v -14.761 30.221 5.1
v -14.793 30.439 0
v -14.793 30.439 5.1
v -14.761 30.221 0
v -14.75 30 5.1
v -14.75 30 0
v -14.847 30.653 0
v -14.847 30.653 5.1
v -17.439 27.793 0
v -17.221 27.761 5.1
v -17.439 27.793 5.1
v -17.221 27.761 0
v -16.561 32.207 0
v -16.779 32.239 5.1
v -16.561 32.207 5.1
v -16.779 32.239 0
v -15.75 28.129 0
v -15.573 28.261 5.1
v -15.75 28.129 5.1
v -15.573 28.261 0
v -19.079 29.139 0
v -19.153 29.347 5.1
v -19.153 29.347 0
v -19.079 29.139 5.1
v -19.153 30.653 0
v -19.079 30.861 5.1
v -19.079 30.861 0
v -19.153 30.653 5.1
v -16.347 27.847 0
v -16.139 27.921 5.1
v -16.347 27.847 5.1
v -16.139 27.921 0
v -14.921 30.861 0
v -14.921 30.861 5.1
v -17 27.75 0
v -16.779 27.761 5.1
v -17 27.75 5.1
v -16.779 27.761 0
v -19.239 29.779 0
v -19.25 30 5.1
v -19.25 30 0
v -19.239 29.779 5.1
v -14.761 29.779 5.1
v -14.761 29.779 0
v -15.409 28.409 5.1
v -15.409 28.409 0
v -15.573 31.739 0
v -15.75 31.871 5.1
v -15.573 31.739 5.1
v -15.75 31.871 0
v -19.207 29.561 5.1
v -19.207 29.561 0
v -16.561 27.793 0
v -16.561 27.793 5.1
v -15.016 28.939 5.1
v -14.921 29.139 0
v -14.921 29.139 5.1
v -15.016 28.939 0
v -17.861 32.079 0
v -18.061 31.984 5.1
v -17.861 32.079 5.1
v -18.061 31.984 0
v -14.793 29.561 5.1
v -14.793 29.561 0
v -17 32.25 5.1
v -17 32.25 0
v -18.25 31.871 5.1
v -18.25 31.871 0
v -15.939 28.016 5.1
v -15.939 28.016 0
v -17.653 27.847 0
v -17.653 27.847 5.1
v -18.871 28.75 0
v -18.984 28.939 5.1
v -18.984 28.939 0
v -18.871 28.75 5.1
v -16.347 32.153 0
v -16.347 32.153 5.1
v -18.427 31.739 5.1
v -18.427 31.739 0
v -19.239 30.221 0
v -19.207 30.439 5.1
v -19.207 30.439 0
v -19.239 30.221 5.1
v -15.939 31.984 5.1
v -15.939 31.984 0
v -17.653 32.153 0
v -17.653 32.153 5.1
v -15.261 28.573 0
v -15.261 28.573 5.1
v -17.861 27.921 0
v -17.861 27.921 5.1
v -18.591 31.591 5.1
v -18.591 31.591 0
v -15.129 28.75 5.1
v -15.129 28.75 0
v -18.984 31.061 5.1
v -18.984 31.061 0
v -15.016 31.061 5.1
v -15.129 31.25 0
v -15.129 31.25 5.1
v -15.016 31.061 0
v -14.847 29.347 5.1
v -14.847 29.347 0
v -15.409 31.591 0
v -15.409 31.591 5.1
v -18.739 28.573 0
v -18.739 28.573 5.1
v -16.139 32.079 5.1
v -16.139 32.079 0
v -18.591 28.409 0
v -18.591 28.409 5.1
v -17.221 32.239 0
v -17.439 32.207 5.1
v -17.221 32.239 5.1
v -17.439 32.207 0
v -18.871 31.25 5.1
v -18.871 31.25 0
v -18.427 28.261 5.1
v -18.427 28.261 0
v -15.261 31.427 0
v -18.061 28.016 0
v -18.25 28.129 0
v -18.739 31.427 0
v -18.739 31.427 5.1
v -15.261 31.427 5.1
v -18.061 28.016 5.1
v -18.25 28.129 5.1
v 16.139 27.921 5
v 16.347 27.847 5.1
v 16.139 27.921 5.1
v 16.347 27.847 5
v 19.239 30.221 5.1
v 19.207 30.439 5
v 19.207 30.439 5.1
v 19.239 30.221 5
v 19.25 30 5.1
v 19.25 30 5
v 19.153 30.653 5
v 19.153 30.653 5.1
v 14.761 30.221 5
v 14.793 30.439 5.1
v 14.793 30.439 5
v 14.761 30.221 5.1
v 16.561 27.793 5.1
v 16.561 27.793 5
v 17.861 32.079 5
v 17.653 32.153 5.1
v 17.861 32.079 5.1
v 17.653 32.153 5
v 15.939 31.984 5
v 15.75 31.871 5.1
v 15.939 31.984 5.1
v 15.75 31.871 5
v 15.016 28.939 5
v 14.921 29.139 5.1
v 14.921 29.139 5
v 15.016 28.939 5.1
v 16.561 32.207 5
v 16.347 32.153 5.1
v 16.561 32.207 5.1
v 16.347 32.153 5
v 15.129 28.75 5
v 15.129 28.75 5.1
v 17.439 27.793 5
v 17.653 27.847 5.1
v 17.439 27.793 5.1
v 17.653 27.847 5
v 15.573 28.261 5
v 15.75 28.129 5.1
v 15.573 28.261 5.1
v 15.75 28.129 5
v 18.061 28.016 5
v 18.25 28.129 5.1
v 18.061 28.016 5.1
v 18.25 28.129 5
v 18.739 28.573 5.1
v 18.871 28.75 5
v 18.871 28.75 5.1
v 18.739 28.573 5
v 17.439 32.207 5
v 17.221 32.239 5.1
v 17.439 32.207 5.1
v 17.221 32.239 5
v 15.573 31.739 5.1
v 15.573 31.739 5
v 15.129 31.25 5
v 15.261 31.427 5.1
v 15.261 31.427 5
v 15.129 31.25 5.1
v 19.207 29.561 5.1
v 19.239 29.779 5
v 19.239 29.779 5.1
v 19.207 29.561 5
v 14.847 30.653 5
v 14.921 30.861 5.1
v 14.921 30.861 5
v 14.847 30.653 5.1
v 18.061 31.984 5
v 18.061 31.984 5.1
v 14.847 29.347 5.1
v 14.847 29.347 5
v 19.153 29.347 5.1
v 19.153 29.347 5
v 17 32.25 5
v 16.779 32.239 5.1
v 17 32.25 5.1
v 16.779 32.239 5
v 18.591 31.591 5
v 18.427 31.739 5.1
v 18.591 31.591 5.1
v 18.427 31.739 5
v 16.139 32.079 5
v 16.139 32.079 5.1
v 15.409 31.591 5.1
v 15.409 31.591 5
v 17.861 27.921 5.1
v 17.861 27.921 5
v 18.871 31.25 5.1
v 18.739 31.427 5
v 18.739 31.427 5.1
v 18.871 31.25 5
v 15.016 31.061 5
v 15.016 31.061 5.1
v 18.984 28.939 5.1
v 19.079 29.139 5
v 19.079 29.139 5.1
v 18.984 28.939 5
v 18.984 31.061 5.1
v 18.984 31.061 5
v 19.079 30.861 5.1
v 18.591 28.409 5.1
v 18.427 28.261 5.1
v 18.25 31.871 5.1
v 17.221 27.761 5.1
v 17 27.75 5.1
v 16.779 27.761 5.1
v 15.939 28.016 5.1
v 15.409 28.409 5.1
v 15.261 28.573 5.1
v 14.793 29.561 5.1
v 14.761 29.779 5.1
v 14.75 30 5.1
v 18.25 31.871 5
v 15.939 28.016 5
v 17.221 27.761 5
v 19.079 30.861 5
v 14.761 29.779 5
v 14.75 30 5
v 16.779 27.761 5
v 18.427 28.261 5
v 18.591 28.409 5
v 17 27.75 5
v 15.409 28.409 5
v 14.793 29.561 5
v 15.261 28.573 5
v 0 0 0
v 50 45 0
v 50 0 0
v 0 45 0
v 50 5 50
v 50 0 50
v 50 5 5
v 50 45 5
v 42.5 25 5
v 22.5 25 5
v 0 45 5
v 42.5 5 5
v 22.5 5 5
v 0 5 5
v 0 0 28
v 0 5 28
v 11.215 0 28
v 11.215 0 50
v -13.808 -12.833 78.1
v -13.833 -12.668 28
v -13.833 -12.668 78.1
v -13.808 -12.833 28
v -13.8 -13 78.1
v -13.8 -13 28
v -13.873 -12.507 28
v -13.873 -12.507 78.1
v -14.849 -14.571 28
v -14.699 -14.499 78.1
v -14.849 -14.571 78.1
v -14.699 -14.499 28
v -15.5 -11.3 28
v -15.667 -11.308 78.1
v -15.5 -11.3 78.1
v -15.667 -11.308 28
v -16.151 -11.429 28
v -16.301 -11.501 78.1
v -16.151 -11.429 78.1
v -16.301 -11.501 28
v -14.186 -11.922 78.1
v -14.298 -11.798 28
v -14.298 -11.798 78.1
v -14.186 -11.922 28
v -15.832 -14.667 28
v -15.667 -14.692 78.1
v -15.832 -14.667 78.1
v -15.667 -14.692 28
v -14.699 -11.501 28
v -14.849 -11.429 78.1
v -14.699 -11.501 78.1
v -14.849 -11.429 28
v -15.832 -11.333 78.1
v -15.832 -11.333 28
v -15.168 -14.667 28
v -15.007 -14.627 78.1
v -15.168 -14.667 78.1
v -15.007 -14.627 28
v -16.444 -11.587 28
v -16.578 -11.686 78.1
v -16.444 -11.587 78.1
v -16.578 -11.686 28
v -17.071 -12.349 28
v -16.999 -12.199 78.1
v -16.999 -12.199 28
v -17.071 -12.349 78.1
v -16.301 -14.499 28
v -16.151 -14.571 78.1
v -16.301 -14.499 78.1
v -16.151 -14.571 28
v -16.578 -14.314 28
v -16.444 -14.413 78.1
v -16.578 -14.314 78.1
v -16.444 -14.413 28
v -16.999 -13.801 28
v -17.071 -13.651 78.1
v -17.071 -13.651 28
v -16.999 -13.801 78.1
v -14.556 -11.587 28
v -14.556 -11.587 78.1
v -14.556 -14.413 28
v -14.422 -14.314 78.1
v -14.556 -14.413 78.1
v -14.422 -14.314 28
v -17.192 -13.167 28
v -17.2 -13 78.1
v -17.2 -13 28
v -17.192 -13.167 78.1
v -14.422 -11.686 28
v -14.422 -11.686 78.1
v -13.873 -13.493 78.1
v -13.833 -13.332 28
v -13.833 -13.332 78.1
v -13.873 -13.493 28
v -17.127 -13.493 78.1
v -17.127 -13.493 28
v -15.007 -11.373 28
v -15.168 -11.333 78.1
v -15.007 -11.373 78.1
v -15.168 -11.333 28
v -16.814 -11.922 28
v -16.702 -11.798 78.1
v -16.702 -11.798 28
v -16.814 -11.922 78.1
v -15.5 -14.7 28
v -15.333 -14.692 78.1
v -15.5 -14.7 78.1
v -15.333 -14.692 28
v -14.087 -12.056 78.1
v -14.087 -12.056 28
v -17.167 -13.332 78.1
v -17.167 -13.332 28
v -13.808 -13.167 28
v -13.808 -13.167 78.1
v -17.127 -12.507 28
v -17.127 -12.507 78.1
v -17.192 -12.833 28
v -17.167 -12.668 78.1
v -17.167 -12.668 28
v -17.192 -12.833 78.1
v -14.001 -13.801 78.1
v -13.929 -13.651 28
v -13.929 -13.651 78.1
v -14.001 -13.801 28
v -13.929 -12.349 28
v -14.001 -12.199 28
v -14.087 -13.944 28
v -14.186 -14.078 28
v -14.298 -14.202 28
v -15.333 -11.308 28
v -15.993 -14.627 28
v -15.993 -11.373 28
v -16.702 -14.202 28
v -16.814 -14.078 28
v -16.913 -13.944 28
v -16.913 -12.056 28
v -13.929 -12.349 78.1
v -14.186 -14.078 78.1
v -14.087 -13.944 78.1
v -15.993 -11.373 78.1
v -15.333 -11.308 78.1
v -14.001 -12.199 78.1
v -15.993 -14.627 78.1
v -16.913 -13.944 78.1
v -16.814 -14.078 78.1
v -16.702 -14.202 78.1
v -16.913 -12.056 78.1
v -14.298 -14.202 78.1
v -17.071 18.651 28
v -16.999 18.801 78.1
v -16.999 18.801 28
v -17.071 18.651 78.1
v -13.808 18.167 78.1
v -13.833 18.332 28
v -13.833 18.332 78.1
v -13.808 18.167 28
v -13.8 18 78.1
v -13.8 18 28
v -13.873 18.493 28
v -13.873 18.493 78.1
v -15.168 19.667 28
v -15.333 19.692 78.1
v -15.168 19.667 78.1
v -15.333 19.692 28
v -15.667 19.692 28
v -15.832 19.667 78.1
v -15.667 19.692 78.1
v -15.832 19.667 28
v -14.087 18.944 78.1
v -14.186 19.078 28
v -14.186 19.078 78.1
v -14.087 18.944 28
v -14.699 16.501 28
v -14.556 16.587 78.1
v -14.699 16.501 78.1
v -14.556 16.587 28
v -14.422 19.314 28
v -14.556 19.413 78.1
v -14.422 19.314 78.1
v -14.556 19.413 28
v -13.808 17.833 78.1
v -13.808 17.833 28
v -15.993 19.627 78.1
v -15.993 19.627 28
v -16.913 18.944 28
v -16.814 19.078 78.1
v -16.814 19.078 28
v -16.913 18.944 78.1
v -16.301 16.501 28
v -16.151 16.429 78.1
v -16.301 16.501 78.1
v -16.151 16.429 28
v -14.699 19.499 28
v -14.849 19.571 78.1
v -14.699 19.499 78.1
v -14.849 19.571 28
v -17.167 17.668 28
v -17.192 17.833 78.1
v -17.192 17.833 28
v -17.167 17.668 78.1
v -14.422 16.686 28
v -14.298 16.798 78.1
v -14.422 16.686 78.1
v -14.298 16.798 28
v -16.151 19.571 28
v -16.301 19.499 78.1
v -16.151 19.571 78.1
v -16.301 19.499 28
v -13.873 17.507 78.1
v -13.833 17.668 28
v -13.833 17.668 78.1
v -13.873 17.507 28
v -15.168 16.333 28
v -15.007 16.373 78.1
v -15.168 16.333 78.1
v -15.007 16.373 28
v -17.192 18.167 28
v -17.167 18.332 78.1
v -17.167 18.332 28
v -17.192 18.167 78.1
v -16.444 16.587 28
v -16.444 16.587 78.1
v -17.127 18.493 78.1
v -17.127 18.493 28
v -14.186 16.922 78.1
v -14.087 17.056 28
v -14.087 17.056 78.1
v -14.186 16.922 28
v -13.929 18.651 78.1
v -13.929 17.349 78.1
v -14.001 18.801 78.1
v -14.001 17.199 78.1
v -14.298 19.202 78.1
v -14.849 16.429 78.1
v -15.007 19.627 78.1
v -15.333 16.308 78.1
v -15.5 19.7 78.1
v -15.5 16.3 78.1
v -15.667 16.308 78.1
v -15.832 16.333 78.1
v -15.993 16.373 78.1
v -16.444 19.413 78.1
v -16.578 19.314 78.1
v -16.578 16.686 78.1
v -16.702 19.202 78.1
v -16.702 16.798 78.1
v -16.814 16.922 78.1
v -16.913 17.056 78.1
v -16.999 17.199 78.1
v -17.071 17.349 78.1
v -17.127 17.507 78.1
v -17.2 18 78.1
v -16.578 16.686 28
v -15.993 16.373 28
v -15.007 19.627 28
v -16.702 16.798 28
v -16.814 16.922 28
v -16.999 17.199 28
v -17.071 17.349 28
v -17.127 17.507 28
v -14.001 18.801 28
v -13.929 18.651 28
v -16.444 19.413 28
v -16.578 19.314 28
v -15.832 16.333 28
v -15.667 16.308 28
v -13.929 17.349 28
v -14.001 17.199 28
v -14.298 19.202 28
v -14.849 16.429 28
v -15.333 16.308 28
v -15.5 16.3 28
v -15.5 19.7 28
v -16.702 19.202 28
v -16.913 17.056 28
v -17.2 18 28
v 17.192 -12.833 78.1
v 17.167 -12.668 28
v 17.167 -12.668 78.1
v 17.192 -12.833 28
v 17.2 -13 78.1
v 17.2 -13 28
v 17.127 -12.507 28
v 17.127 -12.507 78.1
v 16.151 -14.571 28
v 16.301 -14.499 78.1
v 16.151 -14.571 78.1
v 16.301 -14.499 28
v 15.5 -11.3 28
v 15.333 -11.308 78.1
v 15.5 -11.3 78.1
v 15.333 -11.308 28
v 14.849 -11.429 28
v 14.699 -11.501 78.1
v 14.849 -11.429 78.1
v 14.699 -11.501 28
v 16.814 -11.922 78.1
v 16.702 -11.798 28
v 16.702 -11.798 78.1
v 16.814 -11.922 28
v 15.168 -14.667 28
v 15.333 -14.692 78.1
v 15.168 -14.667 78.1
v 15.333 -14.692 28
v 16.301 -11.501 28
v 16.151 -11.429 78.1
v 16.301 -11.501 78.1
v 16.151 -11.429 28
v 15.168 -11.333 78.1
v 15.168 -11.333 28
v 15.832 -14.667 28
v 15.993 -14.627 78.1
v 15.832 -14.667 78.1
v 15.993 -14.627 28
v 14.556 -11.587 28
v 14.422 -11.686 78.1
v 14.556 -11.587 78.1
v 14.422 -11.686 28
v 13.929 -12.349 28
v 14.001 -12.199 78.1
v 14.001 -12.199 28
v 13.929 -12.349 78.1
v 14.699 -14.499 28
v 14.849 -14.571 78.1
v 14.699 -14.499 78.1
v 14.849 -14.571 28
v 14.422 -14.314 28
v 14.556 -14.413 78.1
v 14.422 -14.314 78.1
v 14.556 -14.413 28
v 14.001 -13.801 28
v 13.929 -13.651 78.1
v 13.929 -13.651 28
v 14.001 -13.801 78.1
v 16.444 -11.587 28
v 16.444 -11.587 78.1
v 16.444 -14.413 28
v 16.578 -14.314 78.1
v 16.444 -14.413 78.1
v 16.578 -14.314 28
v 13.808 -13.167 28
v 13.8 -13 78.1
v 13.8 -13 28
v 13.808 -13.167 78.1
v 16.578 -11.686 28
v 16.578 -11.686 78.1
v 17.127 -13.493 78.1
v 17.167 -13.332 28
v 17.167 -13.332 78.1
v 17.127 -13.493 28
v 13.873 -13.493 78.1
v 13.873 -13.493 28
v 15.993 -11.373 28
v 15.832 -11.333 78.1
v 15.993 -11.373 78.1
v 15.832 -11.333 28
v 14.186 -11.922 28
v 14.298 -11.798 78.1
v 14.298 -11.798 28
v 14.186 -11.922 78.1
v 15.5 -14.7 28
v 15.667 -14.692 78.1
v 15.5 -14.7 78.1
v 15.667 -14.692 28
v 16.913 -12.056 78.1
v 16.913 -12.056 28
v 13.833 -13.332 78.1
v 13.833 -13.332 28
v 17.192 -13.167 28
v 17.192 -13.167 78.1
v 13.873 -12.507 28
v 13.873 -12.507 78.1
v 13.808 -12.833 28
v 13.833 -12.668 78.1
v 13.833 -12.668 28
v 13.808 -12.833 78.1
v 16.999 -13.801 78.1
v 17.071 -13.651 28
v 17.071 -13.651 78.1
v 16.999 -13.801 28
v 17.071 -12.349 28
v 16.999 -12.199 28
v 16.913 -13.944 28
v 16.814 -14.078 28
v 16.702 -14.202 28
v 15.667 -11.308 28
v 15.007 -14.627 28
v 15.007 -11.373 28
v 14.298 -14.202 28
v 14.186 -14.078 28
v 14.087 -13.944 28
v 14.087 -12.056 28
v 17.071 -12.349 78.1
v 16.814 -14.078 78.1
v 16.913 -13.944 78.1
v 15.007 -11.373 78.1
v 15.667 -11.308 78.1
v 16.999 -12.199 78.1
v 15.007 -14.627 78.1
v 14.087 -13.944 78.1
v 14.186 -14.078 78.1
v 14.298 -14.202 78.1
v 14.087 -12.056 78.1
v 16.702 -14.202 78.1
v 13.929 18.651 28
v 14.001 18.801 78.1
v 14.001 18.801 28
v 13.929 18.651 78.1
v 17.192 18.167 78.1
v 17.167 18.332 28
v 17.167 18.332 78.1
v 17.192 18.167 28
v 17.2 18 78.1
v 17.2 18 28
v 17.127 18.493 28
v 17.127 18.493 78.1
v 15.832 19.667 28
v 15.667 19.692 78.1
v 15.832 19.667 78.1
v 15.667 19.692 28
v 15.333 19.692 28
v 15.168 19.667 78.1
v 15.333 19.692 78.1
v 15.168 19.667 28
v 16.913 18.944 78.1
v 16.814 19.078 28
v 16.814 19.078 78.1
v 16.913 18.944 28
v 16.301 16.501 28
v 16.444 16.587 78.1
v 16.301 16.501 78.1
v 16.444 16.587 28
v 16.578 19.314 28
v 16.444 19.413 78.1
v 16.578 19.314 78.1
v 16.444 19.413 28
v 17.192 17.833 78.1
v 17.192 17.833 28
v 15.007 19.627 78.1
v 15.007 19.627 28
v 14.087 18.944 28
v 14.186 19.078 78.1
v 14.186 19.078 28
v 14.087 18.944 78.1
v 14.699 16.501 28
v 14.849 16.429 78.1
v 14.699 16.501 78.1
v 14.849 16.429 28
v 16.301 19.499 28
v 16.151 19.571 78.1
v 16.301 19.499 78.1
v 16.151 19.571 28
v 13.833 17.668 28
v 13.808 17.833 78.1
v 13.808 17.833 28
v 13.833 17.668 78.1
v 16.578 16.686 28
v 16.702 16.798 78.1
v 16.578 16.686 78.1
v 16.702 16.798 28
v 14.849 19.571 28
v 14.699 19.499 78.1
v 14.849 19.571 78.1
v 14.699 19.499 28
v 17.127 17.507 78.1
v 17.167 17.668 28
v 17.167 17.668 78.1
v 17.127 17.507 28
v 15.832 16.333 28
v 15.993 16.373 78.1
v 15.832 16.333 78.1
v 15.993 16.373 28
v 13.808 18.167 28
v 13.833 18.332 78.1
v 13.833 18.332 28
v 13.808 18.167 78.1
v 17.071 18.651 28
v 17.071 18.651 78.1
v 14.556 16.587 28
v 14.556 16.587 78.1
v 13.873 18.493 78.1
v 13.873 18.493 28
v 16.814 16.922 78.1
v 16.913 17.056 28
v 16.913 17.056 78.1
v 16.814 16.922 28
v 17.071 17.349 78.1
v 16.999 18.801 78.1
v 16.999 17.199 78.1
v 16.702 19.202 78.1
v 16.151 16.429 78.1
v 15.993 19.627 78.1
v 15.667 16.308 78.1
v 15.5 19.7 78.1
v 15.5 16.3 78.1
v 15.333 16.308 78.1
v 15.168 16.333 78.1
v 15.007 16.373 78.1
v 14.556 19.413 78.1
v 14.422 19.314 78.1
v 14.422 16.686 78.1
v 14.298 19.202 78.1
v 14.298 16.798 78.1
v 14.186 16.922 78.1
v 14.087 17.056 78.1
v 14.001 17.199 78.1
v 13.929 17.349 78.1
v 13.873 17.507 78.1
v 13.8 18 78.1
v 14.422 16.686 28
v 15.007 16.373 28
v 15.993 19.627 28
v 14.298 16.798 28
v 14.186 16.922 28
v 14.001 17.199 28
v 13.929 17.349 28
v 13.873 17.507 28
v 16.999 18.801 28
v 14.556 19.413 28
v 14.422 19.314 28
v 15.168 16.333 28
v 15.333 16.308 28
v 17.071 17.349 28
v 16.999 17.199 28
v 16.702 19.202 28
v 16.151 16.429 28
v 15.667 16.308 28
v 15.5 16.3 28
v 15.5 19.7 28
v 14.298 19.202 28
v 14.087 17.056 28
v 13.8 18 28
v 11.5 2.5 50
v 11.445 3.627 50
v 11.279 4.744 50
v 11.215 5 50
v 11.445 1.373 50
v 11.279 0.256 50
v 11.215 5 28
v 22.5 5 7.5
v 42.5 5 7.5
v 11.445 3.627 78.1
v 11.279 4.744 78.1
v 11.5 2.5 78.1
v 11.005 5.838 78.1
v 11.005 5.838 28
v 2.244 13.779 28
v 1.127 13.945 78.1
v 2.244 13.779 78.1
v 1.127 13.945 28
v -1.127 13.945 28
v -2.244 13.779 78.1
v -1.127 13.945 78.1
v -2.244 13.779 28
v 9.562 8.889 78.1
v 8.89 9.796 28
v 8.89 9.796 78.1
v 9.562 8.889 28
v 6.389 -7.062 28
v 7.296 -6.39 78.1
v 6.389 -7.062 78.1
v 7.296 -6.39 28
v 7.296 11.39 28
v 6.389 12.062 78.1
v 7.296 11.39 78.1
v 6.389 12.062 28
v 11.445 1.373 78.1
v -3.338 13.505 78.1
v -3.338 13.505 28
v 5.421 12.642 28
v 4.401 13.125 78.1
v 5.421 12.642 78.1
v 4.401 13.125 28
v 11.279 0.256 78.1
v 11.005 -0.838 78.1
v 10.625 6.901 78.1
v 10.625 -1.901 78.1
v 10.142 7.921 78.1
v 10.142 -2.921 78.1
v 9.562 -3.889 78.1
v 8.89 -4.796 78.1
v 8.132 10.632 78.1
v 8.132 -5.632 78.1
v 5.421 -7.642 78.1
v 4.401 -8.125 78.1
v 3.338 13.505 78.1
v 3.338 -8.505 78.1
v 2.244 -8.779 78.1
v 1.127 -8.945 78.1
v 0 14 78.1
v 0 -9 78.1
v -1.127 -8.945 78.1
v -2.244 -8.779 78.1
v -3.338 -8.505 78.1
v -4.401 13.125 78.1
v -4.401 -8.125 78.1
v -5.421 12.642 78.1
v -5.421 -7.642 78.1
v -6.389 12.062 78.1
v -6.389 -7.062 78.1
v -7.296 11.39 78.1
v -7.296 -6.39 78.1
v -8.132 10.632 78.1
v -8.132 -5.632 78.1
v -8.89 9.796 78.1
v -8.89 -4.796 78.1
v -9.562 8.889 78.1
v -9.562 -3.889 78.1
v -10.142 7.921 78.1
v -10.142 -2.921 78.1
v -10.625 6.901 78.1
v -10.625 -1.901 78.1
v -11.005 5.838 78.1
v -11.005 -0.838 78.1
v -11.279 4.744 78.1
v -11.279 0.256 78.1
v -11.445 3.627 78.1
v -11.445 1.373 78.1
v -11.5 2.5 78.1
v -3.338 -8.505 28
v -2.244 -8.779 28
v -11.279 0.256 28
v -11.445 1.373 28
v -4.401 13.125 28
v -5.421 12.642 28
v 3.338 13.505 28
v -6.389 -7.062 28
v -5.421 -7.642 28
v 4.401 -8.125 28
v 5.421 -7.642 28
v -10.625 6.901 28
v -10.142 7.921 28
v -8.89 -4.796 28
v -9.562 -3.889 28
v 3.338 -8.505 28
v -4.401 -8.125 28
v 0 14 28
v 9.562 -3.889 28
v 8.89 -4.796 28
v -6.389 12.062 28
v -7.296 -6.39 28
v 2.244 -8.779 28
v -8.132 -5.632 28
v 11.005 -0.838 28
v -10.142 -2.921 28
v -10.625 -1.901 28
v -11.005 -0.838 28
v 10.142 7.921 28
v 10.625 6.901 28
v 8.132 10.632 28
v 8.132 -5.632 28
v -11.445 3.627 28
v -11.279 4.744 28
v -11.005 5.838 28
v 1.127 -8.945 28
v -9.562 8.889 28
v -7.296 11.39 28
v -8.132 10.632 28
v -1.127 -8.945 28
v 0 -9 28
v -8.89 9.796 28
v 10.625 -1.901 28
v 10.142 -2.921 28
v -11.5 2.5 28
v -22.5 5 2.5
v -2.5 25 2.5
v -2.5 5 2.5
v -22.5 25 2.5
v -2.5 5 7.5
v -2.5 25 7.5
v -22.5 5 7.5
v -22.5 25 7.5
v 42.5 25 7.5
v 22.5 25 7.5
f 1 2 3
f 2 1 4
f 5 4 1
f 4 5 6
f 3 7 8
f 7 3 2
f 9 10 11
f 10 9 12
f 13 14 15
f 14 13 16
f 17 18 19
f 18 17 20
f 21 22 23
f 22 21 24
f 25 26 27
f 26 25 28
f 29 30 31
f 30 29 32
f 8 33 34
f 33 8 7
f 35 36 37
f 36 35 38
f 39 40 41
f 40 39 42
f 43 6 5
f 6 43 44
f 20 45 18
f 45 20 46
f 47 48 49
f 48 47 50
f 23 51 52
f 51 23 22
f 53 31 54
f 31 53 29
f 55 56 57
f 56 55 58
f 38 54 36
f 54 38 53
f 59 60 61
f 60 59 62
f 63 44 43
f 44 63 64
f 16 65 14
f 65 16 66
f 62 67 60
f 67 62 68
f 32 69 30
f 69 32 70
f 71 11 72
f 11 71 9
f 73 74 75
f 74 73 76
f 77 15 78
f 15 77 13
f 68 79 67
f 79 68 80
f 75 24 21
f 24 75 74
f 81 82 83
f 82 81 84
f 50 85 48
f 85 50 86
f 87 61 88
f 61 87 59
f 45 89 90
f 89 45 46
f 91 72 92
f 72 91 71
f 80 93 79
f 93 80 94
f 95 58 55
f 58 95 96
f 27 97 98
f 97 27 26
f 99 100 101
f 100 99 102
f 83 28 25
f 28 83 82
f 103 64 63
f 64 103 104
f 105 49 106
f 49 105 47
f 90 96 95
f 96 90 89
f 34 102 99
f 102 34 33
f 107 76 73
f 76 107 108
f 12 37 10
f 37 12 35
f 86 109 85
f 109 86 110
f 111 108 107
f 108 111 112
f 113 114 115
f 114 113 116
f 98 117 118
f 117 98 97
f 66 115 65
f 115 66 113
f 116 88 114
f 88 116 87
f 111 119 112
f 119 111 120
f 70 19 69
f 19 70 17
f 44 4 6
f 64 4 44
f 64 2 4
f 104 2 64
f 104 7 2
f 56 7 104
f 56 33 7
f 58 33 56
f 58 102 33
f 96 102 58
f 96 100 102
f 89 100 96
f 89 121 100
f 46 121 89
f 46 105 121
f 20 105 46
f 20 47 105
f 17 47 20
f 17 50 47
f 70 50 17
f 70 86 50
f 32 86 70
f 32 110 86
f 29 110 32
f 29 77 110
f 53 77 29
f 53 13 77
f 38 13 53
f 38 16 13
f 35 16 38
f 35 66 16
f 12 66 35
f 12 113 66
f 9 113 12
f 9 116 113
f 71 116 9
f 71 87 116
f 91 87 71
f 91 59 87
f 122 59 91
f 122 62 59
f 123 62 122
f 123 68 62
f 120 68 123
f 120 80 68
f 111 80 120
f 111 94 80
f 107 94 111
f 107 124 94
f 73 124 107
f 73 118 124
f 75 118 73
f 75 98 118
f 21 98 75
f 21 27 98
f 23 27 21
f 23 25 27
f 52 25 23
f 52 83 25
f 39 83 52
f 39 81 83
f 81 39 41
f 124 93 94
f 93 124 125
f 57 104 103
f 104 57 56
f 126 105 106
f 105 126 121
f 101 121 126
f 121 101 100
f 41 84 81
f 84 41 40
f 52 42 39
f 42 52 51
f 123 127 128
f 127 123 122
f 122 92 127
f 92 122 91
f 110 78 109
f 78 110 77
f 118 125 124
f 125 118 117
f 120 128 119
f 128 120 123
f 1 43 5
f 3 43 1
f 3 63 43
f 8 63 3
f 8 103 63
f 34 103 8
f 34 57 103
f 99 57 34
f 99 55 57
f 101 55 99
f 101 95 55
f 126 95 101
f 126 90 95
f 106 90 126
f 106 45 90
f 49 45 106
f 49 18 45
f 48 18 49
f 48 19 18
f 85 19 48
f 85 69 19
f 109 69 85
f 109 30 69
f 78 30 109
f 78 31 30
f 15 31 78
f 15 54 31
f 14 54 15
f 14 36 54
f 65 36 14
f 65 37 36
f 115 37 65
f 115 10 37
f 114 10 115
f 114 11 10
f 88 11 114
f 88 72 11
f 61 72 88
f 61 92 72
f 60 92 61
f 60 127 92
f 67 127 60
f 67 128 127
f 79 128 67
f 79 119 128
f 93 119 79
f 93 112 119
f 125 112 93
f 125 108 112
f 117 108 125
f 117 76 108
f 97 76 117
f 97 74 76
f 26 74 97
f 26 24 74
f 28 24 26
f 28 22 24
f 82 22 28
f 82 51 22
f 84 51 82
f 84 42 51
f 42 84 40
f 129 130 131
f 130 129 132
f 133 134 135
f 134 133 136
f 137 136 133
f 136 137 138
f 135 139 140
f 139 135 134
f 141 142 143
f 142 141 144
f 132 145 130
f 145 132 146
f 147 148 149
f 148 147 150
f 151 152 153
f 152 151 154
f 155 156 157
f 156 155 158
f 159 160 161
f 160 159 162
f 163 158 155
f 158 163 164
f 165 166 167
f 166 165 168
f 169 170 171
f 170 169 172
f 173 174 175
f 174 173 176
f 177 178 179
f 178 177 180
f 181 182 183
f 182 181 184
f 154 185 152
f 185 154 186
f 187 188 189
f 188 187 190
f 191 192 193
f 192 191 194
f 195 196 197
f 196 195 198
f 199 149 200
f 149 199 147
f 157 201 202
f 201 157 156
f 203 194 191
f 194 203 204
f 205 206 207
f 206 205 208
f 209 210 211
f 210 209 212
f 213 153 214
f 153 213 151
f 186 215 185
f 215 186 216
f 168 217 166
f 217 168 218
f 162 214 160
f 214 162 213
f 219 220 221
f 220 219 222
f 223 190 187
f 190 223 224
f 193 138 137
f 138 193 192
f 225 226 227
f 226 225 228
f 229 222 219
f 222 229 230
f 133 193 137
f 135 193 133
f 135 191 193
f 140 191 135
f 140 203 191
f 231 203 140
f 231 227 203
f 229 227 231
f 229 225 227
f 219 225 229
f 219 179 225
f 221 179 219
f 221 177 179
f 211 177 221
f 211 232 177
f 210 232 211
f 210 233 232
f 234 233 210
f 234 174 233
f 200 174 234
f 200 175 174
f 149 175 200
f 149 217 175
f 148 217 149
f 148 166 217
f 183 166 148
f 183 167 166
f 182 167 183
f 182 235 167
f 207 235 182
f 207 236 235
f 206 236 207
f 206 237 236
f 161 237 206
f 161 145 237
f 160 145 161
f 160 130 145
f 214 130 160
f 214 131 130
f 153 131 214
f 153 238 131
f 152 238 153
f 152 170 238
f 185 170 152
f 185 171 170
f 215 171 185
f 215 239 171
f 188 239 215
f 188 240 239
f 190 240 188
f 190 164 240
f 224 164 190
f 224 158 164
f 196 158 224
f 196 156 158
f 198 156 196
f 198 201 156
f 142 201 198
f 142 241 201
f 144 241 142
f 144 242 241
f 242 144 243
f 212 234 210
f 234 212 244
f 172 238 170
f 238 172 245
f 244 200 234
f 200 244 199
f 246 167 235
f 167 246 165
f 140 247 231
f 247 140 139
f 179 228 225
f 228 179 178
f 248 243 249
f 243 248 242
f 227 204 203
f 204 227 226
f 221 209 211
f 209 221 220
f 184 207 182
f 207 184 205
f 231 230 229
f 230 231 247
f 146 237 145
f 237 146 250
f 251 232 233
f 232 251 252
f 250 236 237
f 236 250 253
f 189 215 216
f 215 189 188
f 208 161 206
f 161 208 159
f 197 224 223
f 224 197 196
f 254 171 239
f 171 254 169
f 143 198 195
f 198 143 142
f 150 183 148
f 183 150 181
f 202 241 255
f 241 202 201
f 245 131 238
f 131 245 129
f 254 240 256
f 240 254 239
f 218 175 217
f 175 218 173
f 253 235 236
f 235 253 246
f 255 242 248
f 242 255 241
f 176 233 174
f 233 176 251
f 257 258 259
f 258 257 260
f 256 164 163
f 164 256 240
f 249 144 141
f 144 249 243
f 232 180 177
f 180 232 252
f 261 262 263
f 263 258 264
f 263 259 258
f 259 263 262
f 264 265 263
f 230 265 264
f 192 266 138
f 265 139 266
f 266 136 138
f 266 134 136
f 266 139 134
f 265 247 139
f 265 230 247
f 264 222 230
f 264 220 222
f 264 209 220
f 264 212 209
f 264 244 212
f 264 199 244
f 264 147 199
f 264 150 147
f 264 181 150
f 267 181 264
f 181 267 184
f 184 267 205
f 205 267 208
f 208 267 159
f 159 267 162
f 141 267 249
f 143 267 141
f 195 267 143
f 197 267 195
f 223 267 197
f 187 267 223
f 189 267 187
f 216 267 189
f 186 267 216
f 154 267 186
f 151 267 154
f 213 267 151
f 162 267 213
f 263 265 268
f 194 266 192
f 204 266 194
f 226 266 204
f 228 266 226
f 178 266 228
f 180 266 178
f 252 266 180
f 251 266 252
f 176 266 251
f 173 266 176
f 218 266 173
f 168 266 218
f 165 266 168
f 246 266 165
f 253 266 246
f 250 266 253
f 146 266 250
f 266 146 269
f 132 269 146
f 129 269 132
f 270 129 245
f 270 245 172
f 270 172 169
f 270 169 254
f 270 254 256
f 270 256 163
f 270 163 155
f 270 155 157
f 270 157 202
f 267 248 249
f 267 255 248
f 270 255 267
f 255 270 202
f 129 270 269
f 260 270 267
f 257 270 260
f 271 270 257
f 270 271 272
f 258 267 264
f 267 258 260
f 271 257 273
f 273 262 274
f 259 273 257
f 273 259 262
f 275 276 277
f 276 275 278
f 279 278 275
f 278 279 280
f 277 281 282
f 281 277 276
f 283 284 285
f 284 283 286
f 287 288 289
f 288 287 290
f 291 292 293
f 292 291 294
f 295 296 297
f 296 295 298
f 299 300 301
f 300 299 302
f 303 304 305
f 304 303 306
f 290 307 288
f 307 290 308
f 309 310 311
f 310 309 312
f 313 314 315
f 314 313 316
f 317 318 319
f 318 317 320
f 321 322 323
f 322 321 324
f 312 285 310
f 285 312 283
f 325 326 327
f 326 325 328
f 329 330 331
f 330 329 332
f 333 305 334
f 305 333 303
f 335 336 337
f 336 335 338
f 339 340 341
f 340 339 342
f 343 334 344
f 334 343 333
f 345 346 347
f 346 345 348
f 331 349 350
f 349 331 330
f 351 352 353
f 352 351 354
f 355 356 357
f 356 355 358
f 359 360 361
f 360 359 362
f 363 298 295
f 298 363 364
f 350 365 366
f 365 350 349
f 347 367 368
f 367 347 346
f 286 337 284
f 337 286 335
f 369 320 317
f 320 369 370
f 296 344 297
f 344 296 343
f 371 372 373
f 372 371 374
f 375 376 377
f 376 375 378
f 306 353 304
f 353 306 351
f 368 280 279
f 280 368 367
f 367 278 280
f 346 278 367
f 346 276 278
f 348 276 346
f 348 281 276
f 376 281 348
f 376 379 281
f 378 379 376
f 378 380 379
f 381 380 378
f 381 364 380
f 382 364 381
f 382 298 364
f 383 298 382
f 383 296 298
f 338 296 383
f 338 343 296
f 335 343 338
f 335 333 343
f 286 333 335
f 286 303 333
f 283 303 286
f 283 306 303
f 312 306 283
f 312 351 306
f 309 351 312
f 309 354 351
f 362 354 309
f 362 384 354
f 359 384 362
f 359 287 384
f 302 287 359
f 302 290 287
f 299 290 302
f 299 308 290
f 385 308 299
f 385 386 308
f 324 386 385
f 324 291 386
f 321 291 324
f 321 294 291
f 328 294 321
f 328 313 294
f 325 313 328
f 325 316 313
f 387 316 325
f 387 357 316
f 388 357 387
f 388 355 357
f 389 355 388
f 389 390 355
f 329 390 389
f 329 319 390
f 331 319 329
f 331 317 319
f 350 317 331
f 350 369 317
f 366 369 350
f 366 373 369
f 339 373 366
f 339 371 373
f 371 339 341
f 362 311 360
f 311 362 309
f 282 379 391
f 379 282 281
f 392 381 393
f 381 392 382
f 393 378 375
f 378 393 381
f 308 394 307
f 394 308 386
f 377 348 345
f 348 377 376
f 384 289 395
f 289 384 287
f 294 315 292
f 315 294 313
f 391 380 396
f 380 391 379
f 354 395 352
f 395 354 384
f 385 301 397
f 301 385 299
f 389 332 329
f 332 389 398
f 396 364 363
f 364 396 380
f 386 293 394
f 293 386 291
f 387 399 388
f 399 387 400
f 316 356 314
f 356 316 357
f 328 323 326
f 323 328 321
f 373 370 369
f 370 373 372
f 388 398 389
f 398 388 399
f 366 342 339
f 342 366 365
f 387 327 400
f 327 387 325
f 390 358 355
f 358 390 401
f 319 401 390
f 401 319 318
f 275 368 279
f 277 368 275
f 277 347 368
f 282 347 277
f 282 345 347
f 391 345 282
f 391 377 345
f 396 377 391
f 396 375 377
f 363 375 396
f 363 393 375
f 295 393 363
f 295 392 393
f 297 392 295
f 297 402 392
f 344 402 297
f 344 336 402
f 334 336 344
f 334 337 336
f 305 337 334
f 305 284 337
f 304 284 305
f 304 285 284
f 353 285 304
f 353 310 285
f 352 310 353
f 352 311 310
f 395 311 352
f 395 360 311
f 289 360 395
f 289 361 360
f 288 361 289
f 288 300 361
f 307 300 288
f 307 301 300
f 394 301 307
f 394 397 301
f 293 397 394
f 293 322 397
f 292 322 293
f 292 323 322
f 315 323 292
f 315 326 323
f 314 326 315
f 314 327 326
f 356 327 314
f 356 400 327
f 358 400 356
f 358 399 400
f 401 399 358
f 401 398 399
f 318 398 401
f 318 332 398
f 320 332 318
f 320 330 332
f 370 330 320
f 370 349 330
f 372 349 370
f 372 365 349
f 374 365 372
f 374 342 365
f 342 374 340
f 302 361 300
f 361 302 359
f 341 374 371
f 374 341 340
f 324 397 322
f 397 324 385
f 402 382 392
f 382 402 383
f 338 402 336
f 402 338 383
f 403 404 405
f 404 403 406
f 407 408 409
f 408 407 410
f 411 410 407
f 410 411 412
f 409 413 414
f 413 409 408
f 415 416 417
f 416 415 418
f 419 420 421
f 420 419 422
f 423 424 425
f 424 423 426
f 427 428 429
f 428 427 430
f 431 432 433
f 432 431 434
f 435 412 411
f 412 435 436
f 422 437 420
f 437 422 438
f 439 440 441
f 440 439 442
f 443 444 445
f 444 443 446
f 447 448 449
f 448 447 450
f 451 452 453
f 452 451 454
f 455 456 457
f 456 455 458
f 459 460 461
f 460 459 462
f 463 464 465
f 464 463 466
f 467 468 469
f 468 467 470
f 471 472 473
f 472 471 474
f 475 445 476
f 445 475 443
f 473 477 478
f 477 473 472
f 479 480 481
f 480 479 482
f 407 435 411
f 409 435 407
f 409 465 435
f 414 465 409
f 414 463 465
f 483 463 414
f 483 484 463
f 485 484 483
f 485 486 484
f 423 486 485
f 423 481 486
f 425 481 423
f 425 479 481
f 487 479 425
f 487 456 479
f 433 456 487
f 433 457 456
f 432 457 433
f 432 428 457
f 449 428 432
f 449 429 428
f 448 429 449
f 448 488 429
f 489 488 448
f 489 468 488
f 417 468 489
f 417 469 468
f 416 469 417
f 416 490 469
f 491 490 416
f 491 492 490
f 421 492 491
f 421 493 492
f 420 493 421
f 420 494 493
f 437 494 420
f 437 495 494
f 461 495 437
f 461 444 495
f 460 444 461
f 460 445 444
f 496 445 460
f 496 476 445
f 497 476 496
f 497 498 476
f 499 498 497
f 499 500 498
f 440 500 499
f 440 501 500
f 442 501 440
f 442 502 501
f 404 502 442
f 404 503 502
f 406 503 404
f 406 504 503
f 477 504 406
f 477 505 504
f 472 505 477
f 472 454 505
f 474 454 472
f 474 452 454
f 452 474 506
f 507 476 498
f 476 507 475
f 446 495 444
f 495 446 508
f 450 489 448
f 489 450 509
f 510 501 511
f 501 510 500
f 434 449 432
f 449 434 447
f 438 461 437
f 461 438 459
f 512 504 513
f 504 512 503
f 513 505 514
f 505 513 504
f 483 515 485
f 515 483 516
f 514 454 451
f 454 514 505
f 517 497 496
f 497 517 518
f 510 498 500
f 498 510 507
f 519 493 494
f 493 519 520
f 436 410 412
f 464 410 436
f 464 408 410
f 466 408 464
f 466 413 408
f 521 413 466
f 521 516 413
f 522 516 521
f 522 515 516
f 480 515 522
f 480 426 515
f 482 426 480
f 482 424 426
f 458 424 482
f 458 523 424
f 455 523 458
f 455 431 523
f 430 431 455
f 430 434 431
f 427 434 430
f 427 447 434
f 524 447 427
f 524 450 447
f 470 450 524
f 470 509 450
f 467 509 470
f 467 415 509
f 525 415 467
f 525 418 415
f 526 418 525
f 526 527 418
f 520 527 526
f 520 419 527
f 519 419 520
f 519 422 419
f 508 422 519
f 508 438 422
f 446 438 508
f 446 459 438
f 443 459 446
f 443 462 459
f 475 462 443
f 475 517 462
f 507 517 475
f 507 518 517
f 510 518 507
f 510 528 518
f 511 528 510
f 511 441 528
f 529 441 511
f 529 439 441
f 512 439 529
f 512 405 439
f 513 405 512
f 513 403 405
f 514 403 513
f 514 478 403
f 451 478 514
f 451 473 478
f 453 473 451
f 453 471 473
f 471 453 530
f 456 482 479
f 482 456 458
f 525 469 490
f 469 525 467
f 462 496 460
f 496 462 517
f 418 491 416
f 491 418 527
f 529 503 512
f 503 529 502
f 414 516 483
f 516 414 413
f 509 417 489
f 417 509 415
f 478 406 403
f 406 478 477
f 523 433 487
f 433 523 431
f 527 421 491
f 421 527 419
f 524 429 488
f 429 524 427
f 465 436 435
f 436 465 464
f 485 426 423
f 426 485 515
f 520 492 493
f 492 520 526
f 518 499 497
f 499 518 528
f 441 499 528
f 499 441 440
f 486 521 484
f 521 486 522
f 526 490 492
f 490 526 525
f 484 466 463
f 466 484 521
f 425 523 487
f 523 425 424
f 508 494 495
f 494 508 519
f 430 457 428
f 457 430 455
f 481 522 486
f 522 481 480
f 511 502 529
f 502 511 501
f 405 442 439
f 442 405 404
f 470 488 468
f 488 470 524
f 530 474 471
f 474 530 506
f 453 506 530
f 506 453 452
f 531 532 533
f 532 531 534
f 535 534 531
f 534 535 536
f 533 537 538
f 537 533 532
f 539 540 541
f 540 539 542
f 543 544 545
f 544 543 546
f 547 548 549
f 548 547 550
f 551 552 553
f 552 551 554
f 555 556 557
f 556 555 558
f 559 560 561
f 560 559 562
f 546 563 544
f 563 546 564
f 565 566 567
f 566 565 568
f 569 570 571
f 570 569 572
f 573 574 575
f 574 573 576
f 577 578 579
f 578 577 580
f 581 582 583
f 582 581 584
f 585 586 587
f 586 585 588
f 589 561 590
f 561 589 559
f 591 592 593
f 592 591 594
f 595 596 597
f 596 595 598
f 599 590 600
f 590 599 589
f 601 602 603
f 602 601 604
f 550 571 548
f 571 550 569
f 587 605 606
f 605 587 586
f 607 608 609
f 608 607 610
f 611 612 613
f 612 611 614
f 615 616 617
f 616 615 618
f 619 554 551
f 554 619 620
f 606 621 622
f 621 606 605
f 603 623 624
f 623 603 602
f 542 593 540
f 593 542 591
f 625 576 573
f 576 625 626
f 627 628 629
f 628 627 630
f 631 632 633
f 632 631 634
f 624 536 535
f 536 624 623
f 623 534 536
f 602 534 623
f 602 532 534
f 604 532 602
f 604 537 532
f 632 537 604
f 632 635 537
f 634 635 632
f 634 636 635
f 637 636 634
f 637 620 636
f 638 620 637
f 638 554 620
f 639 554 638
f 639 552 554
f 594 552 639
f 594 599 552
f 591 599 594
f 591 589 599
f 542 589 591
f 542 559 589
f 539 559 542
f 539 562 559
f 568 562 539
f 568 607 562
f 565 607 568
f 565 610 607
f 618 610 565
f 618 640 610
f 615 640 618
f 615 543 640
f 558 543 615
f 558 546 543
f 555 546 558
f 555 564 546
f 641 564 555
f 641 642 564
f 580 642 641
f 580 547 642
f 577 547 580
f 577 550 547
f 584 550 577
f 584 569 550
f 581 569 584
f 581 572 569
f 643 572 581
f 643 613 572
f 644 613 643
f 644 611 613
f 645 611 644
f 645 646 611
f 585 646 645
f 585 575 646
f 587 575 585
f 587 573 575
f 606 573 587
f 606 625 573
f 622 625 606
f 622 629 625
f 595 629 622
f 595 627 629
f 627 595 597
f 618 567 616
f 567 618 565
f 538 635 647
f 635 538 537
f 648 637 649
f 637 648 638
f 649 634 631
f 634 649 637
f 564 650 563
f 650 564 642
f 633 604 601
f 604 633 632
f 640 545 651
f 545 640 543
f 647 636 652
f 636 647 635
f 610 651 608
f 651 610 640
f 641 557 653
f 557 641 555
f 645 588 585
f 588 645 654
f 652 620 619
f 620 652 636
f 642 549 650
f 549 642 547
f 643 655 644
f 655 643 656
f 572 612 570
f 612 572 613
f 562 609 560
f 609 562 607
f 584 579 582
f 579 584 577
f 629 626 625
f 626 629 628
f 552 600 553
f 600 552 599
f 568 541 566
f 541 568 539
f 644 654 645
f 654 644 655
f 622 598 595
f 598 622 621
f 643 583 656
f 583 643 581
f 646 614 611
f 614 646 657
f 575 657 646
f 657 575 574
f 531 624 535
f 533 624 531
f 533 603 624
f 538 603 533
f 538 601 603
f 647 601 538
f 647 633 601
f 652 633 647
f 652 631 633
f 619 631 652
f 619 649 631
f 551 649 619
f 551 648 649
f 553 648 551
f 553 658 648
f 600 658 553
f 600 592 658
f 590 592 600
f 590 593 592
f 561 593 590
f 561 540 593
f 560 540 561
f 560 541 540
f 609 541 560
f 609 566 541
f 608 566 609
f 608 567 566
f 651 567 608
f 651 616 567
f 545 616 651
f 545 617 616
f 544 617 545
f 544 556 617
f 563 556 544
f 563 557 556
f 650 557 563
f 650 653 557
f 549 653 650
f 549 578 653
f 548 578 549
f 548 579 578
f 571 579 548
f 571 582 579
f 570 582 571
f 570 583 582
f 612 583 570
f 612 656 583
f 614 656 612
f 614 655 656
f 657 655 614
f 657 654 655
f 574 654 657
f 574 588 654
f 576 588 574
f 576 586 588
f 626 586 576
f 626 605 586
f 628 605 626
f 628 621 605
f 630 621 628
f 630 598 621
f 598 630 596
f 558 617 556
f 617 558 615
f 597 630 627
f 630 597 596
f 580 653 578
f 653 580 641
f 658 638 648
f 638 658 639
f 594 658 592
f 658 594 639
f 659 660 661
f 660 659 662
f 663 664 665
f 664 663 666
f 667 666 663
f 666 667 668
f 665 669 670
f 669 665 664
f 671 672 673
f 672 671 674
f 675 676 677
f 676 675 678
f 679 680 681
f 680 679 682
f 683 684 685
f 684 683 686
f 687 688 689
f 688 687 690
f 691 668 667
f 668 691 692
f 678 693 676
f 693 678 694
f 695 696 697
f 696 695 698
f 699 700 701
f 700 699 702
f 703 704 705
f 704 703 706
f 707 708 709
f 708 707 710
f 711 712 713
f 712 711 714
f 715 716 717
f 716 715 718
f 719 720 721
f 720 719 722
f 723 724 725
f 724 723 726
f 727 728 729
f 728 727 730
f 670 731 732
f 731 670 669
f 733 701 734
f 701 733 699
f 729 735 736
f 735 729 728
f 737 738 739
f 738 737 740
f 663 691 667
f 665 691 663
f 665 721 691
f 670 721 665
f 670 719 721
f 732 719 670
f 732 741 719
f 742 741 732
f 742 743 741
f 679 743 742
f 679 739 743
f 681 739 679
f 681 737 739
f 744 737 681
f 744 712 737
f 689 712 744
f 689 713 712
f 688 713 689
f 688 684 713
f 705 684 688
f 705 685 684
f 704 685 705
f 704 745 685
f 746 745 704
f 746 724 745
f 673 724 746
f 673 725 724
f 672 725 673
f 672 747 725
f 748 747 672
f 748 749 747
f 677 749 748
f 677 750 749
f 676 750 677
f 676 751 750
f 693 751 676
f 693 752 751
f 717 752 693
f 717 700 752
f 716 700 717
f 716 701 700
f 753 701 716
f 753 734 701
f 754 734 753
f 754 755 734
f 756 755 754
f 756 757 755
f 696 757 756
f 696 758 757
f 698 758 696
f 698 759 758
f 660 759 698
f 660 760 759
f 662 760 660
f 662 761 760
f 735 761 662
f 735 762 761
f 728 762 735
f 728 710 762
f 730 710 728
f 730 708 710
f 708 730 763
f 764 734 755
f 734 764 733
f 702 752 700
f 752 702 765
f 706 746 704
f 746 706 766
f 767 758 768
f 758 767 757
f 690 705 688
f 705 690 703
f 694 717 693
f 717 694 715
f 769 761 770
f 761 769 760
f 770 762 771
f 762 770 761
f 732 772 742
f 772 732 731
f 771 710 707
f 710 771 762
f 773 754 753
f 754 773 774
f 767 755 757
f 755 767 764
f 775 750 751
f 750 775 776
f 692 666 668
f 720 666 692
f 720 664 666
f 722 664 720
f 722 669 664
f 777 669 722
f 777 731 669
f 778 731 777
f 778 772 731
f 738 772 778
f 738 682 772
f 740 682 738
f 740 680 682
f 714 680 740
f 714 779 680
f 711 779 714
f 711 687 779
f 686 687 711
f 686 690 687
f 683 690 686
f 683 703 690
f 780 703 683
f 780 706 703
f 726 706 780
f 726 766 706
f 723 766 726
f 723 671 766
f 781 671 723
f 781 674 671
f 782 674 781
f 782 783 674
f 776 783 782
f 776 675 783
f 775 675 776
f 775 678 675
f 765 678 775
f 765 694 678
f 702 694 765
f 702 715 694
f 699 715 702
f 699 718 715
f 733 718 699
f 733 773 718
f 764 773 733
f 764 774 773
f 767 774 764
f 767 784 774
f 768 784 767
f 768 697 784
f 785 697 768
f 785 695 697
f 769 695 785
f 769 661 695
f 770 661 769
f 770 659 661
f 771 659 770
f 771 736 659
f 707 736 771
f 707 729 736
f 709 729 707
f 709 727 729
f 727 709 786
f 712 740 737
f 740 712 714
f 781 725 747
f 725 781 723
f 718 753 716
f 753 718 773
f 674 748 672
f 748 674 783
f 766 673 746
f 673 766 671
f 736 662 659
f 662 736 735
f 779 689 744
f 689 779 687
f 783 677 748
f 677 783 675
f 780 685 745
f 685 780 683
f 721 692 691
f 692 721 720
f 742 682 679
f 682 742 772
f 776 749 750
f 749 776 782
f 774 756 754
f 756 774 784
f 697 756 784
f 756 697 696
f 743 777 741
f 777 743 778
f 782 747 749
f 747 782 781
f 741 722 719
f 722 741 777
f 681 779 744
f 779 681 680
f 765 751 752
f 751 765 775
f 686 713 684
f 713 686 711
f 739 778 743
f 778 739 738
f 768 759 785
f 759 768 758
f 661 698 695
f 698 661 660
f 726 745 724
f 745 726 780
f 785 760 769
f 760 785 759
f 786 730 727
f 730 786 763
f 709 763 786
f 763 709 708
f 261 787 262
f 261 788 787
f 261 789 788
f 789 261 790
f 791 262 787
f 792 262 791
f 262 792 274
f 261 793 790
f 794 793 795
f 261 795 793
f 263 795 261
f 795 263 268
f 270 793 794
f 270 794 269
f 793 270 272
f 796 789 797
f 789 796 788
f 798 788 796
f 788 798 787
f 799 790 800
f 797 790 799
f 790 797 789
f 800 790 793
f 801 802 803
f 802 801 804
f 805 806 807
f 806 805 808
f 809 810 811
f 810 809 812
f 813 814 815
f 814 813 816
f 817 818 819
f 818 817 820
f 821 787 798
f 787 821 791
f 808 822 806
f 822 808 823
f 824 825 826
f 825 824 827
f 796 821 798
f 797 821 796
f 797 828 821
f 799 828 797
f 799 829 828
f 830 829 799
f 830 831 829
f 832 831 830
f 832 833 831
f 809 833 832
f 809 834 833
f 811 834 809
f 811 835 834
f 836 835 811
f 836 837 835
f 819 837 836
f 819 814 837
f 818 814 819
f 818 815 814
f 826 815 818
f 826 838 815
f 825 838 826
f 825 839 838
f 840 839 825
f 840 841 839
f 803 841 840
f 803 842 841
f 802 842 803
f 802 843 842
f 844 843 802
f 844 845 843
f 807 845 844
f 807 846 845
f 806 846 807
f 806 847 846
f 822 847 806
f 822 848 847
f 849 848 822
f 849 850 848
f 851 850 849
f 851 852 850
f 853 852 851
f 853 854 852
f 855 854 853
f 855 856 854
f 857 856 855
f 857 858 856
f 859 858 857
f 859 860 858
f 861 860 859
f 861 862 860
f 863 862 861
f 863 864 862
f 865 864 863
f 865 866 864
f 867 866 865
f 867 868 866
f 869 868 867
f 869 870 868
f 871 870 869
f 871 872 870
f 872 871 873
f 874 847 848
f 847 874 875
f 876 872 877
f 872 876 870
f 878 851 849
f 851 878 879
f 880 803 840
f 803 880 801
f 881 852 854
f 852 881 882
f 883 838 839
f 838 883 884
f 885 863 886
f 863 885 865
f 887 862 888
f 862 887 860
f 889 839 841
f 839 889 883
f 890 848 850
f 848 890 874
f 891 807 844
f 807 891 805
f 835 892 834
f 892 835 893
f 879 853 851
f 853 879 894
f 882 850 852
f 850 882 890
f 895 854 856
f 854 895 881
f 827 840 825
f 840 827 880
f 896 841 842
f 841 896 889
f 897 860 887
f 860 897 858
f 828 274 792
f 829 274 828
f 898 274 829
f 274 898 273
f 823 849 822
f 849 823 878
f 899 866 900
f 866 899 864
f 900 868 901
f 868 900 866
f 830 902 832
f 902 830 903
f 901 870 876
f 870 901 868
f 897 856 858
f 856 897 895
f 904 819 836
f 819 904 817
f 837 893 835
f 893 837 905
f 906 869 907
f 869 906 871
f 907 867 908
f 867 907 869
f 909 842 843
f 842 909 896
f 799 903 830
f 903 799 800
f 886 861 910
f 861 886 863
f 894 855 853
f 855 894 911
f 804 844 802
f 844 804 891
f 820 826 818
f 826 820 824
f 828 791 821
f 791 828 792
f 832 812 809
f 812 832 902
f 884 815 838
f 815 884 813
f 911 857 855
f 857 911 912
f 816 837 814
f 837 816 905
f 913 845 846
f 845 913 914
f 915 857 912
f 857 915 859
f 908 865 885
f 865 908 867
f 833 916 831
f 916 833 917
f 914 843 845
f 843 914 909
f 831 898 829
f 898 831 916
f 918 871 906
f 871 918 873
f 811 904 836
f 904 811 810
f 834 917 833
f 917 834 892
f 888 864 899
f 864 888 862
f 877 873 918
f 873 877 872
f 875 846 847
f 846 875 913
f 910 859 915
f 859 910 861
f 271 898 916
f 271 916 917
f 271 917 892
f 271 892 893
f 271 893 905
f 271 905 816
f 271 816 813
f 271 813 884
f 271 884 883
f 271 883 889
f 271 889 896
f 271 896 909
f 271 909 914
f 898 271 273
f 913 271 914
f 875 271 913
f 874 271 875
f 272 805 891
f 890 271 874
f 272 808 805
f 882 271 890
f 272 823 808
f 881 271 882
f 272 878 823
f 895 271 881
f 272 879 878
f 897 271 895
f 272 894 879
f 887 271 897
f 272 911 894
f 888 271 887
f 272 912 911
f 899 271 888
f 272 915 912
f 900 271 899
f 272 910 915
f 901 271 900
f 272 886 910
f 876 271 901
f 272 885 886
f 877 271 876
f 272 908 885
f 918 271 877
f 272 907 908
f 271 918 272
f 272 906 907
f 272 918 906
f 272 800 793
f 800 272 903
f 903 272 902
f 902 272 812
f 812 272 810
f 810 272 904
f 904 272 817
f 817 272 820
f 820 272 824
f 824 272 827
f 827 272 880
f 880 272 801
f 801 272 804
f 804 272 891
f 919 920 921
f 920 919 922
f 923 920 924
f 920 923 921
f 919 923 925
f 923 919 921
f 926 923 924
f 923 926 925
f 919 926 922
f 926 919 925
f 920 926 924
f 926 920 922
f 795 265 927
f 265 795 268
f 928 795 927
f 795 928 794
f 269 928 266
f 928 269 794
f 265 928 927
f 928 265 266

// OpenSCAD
// NEMA 17 Stepper Motor L-Bracket
// Print orientation: Base plate on XY plane (Z=0), building upward.
// Centred on origin in X and Y.

// Base Plate Dimensions
$base_x = 50; // x from -25 to 25
$base_y = 45; // y from 0 to 45
$base_z = 5;  // z from 0 to 5

// Base Mounting Holes (M4)
$base_hole_d = 4.5;
$base_hole_x1 = -17;
$base_hole_y1 = 30;
$base_hole_x2 = 17;
$base_hole_y2 = 30;

// Vertical Motor Plate Dimensions
$motor_plate_x = 50; // x from -25 to 25
$motor_plate_y = 5;  // y from 0 to 5
$motor_plate_z = 50; // z from 0 to 50

// Motor Boss Hole
$boss_hole_d = 23;
$boss_hole_x = 0;
$boss_hole_z = 28;

// Motor Screw Holes (M3)
$screw_hole_d = 3.4;
$screw_pattern_size = 31; // 31 mm square pattern
$screw_hole_count = 4;

// Gusset Dimensions
$gusset_thickness = 5; // x thickness
$gusset_leg_y = 20;    // leg along +Y
$gusset_leg_z = 20;    // leg along +Z
$gusset_x_start_left = -25;
$gusset_x_end_left = -20;
$gusset_x_start_right = 20;
$gusset_x_end_right = 25;
$gusset_corner_y = 5;
$gusset_corner_z = 5;

// Global settings
$fn = 64;

module base_plate() {
    // Main block
    translate([0, 0, 0])
        cube([$base_x, $base_y, $base_z]);

    // Cut M4 holes
    $fn = 64;
    for (i = [0, 1]) {
        translate([
            i == 0 ? $base_hole_x1 : $base_hole_x2,
            i == 0 ? $base_hole_y1 : $base_hole_y2,
            0
        ])
            cylinder(
                h = $base_z + 0.1, // Extend slightly past top face
                d = $base_hole_d,
                $fn = 64
            );
    }
}

module motor_plate() {
    // Main block
    translate([0, 0, 0])
        cube([$motor_plate_x, $motor_plate_y, $motor_plate_z]);

    // Cut Boss Hole
    translate([
        $boss_hole_x,
        $motor_plate_y / 2, // Centre in Y (plate is 5mm wide, so y=2.5)
        $boss_hole_z
    ])
        cylinder(
            h = $motor_plate_z + 0.1, // Extend slightly past top/bottom
            d = $boss_hole_d,
            $fn = 64
        );

    // Cut Screw Holes (31mm square pattern centred on boss)
    // Pattern size 31mm means distance between opposite holes is 31mm.
    // Offset from center = 31 / 2 = 15.5mm.
    $offset = $screw_pattern_size / 2;
    $y_pos = $motor_plate_y / 2; // Centre Y of plate

    for (i = [0, 1]) {
        for (j = [0, 1]) {
            translate([
                $boss_hole_x + (i == 0 ? -$offset : $offset),
                $y_pos + (j == 0 ? -$offset : $offset),
                $boss_hole_z
            ])
                cylinder(
                    h = $motor_plate_z + 0.1, // Extend slightly past top/bottom
                    d = $screw_hole_d,
                    $fn = 64
                );
        }
    }
}

module gusset() {
    // Right triangle in YZ plane, extruded along X
    // Legs: 20mm along +Y, 20mm along +Z
    // Right angle corner at (y=5, z=5) relative to global origin
    // The triangle vertices in YZ plane:
    // (y=5, z=5) -> (y=25, z=5) -> (y=5, z=25)
    
    translate([0, $gusset_corner_y, $gusset_corner_z]) {
        // Define the triangle path
        path = [
            [0, 0], // Relative to corner: (0,0) is corner
            [$gusset_leg_y, 0], // Along Y
            [$gusset_leg_y, $gusset_leg_z], // Top corner
            [0, $gusset_leg_z] // Along Z back to start
        ];
        
        // Extrude along X with thickness
        translate([$gusset_thickness / 2, 0, 0])
            linear_extrude(height = $gusset_thickness, center = true)
                polygon(points = path);
    }
}

module main() {
    union() {
        base_plate();
        motor_plate();
        
        // Left Gusset (x from -25 to -20)
        translate([$gusset_x_start_left, 0, 0])
            gusset();
            
        // Right Gusset (x from 20 to 25)
        translate([$gusset_x_start_right, 0, 0])
            gusset();
    }
}

main();
